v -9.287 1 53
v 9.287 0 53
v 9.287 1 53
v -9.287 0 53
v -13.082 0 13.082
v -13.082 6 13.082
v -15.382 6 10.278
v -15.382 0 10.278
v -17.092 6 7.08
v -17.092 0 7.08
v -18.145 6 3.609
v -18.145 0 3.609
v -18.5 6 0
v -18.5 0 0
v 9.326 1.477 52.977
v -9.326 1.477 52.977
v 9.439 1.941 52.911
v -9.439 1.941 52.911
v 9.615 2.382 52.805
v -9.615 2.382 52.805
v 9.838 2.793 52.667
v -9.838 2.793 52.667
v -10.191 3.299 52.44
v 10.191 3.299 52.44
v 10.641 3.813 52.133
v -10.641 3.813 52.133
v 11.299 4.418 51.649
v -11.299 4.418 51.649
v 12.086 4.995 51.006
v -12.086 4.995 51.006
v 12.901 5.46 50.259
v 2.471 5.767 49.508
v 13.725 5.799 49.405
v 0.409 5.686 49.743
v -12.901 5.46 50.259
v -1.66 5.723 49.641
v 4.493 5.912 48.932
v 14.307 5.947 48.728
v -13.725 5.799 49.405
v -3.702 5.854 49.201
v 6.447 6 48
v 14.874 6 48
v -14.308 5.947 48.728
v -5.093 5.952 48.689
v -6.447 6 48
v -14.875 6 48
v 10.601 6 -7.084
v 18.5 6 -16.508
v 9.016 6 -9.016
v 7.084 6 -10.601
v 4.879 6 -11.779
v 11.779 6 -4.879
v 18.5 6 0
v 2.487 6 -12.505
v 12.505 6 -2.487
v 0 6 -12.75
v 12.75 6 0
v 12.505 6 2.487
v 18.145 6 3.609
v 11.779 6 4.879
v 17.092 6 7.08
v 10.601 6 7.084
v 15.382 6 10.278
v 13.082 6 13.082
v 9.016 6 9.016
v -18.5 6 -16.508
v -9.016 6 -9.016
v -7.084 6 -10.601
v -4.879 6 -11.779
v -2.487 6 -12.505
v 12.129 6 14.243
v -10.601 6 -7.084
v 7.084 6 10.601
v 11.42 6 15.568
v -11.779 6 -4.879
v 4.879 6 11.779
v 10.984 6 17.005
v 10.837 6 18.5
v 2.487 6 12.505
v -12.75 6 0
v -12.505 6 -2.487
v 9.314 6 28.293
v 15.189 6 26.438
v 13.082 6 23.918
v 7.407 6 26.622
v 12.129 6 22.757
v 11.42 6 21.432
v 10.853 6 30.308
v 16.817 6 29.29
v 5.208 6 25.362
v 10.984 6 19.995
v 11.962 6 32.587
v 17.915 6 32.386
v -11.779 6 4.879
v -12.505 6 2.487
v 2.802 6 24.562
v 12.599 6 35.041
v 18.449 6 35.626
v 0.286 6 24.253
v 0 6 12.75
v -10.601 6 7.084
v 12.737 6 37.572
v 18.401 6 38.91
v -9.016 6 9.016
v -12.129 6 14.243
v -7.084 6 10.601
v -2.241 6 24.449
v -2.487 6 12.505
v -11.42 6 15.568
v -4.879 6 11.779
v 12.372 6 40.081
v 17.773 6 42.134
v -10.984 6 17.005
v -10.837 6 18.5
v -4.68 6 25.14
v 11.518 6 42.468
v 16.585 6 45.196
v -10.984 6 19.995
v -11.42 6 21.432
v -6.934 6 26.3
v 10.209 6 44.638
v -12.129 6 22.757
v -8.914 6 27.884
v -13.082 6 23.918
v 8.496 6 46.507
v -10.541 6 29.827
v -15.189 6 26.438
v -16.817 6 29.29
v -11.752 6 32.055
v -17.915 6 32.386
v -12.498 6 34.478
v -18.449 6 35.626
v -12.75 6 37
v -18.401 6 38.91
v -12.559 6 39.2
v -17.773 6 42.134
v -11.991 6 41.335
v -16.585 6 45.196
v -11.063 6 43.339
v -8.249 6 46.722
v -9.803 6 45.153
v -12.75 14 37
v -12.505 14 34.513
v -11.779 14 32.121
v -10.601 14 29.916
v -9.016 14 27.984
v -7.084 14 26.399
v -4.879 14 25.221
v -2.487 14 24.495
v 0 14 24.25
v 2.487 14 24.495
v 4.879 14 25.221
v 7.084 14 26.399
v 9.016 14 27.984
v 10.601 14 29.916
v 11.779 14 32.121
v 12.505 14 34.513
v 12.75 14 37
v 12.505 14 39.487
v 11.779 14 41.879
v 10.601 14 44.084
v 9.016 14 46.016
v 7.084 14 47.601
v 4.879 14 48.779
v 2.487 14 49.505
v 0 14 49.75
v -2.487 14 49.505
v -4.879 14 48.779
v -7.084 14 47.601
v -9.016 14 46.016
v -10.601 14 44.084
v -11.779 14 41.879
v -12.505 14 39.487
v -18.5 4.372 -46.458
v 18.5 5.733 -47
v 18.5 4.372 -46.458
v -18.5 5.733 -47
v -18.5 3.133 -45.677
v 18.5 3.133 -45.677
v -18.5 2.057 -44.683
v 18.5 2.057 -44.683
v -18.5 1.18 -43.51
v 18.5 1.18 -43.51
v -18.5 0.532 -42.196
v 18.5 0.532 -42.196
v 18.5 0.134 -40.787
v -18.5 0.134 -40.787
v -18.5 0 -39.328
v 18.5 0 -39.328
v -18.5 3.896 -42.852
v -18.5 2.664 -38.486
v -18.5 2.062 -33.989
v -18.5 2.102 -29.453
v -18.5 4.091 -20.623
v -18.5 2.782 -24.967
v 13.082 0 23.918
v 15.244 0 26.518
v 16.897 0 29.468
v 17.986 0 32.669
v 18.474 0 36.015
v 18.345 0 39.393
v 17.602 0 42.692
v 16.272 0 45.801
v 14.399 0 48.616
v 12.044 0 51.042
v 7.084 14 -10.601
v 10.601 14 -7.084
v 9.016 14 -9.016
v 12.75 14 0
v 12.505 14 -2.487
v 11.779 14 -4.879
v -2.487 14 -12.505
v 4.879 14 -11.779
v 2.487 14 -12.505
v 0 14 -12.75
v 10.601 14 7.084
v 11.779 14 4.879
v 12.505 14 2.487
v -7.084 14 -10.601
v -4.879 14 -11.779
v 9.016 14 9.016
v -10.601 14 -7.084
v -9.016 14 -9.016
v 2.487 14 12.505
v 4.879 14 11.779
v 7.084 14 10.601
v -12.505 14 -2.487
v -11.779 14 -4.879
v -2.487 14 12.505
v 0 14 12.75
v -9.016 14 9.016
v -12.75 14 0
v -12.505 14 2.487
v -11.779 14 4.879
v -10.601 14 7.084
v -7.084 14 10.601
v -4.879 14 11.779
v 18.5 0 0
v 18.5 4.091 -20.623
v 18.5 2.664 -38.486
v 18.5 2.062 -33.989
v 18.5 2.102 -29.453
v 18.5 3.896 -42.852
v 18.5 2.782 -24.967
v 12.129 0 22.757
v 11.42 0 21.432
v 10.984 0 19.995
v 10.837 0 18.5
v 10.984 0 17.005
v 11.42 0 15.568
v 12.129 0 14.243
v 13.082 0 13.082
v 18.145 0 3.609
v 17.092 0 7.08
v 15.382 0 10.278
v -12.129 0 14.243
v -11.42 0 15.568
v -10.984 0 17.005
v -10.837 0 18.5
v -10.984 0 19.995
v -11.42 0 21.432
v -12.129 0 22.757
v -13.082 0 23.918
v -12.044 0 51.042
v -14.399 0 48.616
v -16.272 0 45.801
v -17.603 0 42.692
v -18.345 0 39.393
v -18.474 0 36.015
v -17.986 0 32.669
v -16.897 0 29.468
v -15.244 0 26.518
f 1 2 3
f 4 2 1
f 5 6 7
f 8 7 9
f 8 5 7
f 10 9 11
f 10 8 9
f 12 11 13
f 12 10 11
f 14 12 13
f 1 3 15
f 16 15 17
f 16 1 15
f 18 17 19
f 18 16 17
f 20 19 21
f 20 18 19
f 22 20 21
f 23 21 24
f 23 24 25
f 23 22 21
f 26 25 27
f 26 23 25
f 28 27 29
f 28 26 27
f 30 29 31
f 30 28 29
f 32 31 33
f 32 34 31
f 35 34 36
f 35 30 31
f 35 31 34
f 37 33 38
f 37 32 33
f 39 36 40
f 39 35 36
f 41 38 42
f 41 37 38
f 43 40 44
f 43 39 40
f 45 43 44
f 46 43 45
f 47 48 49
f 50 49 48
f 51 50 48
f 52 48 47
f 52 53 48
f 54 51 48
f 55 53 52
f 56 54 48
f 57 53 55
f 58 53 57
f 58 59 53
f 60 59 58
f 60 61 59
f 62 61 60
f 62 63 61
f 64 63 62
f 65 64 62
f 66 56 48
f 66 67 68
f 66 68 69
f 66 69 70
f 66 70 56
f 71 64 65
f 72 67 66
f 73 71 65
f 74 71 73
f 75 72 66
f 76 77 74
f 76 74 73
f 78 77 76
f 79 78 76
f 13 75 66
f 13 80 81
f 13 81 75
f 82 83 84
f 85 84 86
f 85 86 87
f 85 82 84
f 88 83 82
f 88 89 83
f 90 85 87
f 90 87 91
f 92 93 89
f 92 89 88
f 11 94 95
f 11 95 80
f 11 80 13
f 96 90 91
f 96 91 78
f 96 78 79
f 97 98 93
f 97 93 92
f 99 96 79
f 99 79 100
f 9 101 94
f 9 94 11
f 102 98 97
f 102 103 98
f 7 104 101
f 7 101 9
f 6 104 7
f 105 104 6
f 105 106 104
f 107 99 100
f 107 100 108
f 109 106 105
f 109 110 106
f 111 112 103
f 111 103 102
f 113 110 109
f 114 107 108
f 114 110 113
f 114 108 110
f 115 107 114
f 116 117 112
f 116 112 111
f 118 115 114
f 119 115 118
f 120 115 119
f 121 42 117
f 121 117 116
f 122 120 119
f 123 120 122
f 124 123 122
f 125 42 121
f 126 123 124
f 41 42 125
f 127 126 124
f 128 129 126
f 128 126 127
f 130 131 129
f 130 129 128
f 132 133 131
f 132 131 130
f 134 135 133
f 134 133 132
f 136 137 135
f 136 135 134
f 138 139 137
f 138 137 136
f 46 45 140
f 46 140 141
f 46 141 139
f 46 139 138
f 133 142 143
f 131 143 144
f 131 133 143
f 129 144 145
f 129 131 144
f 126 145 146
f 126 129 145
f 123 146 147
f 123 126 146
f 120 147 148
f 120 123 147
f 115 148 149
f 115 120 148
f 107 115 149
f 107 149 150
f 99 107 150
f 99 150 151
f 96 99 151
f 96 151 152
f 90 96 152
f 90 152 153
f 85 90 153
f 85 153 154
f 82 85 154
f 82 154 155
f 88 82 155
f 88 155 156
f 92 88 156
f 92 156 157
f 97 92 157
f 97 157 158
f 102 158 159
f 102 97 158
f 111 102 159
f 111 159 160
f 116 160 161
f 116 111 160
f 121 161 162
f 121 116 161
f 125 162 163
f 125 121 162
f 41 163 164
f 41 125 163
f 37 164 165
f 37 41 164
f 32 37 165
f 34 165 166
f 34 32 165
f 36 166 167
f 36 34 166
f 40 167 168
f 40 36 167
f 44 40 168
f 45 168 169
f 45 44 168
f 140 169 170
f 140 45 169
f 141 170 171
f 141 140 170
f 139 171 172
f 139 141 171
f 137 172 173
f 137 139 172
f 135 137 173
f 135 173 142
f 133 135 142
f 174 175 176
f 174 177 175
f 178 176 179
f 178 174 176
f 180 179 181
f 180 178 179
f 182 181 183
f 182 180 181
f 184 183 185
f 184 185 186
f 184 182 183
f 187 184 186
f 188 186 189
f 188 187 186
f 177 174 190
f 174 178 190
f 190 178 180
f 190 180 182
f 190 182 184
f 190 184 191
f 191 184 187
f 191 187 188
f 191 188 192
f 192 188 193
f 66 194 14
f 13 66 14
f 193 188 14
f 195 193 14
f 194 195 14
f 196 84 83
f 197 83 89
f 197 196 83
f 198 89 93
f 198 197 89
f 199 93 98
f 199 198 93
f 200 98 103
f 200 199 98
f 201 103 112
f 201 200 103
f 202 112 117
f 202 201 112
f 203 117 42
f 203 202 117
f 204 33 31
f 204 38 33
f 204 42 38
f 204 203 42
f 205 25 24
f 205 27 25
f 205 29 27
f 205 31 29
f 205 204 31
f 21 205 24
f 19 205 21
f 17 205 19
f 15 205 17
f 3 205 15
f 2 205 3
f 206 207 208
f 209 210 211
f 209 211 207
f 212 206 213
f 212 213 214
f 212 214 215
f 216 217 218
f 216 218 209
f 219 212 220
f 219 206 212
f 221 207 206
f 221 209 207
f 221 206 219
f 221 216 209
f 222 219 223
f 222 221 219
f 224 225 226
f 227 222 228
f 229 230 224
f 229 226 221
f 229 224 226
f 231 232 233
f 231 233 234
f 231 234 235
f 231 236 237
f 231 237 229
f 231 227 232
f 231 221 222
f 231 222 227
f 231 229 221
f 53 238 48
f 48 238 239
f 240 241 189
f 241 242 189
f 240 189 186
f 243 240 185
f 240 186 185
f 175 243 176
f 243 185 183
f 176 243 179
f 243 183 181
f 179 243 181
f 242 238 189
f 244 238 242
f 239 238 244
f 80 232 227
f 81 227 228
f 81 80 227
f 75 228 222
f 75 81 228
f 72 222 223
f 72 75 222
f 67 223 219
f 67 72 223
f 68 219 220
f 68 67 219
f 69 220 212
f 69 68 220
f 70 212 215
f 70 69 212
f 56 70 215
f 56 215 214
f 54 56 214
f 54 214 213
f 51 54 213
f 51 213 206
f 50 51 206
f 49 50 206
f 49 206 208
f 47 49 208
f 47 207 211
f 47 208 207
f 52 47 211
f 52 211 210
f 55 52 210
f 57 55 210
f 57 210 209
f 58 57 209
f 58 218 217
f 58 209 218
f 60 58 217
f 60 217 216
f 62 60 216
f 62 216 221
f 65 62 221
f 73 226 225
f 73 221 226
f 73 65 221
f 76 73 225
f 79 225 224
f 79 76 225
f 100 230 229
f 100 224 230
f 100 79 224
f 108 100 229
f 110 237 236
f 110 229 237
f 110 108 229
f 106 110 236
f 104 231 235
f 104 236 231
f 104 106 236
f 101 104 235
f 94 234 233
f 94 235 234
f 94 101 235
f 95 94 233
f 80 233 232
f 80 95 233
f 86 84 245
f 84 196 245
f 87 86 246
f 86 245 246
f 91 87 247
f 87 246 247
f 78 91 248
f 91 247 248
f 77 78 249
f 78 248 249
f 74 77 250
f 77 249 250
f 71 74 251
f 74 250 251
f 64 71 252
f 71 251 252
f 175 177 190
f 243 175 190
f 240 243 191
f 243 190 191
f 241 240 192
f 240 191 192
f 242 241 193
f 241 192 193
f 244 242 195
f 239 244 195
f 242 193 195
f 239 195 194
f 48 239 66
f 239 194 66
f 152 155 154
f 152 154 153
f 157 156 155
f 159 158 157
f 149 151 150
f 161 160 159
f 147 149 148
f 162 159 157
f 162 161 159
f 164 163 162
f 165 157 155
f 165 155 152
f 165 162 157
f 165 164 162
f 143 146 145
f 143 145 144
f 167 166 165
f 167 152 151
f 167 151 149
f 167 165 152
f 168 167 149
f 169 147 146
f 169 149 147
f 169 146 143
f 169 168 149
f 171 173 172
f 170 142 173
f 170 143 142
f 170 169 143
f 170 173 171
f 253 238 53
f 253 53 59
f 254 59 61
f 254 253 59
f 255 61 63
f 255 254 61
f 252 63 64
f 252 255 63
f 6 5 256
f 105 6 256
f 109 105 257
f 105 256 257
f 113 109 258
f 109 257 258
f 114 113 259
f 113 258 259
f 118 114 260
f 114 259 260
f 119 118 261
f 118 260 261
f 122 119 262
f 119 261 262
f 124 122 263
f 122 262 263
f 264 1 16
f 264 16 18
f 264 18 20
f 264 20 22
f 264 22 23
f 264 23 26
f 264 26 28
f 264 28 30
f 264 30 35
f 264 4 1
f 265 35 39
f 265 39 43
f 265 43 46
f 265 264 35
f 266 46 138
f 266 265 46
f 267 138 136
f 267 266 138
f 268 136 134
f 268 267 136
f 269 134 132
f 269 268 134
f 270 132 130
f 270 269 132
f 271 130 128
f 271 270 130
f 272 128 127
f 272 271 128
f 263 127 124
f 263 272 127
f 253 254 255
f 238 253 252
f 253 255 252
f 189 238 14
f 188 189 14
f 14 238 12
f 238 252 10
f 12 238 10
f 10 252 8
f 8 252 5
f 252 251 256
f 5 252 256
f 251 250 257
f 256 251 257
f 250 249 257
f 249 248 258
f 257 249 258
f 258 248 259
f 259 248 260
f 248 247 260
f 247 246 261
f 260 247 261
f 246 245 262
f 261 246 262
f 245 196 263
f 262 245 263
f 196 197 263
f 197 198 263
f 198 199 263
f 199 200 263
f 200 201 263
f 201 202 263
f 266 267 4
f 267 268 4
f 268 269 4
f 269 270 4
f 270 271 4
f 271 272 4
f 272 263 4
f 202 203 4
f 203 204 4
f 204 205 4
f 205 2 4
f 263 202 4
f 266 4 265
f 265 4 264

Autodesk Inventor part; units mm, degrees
ref_plane "YZ Plane" through (0, 0, 0) normal (1, 0, 0) x (0, 1, 0)
ref_plane "XZ Plane" through (0, 0, 0) normal (0, 1, 0) x (-1, 0, 0)
ref_plane "XY Plane" through (0, 0, 0) normal (0, 0, 1) x (1, 0, 0)
sketch "Sketch1" plane through (0, 0, 0) normal (0, 1, 0) x (-1, 0, 0)
  line L0 (25.9, 0) -> (-25.9, 0) projected
  line L1 (0, -25.9) -> (0, 25.9) projected
  circle A0 centre (0, 0) radius 18.5 construction
  circle A1 centre (0, 0) radius 13 construction
  dimension "d0" = 37
  dimension "d1" = 26
sketch "Sketch2" plane through (0, 0, 0) normal (0, 1, 0) x (-1, 0, 0)
  line L0 (25.9, 0) -> (-25.9, 0) projected
  line L1 (0, -35.8) -> (0, 67.8) projected
  line L2 (-18.5, 53) -> (-18.5, -21)
  line L3 (-18.5, -21) -> (18.5, -21)
  line L4 (18.5, -21) -> (18.5, 53)
  line L5 (-18.5, 53) -> (18.5, 53)
  point P0 (0, 0)
  dimension "d3" = 37
  dimension "d29" = 21
  dimension "d30" = 53
extrude "Extrusion1" add sketch "Sketch2" along normal blind 6
sketch "Sketch6" plane through (0, 0, 0) normal (0, 1, 0) x (-1, 0, 0)
  line L0 (18.5, -21) -> (-18.5, -21) projected
  line L1 (18.5, 53) -> (18.5, -21) projected
  line L2 (-18.5, -21) -> (18.5, -21)
  line L3 (18.5, -21) -> (18.5, 53)
  line L4 (-18.5, 53) -> (-18.5, -21)
  line L5 (25.9, 0) -> (-25.9, 0) projected
  line L6 (0, -36.3) -> (0, 70.8) projected
  arc A0 (-16, 0) -> (16, 0) centre (0, 0) ccw
  line L7 (16, 0) -> (16, 53)
  line L8 (18.5, 53) -> (-18.5, 53) projected
  line L9 (16, 53) -> (18.5, 53)
  line L10 (-16, 0) -> (-16, 53)
  line L11 (-16, 53) -> (-18.5, 53)
  point P0 (-17.3617, -21)
  dimension "d18" = 32
extrude "Extrusion5" [suppressed]
sketch "Sketch4" plane through (0, 0, 0) normal (0, 0, 1) x (1, 0, 0)
  line L0 (-18.5, 0) -> (18.5, 0)
  line L1 (18.5, 0) -> (18.5, -2)
  line L2 (18.5, -2) -> (-18.5, -2)
  line L3 (-18.5, -2) -> (-18.5, 0)
  line L4 (-25.9, 0) -> (25.9, 0) projected
  line L5 (0, -2.4) -> (0, 0.4) projected
  point P0 (0, 0)
  dimension "d10" = 37
  dimension "d11" = 2
extrude "Extrusion6" [suppressed]
sketch "Sketch5" plane through (0, 0, 0) normal (0, 1, 0) x (-1, 0, 0)
  circle A0 centre (0, 0) radius 18.5 construction
  circle A1 centre (0, 0) radius 18.5 construction
  line L0 (25.9, 0) -> (-25.9, 0) projected
  line L1 (0, -28.9) -> (0, 26.4) projected
  line L2 (-18.5, -21) -> (18.5, -21)
  line L3 (18.5, -21) -> (18.5, -18.5)
  line L4 (18.5, -18.5) -> (-18.5, -18.5)
  line L5 (-18.5, -18.5) -> (-18.5, -21)
  dimension "d25" = 37
  dimension "d26" = 21
extrude "Extrusion7" [suppressed]
sketch "Sketch7" plane through (0, 0, 0) normal (0, 0, 1) x (1, 0, 0)
  line L0 (-18.5, 0) -> (18.5, 0)
  line L1 (18.5, 0) -> (18.5, -2)
  line L2 (18.5, -2) -> (-18.5, -2)
  line L3 (-18.5, -2) -> (-18.5, 0)
  line L4 (18.5, 0) -> (-18.5, 0) projected
  line L5 (-25.9, 0) -> (25.9, 0) projected
  line L6 (0, -2.4) -> (0, 0.4) projected
  point P0 (-16, 0)
  point P1 (16, 0)
  dimension "d53" = 2
  dimension "d54" = 18.5
extrude "Extrusion8" [suppressed]
sketch "Sketch8" plane through (0, 0, 0) normal (0, 1, 0) x (-1, 0, 0)
  circle A0 centre (0, 0) radius 12.75
  dimension "d34" = 25.5
extrude "Extrusion9" add sketch "Sketch8" along normal blind 14
pattern_linear "Rectangular Pattern1" count 2 spacing 37 along (0, 0, 1) of "Extrusion9"
sketch "Sketch9" plane through (0, 6, 0) normal (0, 1, 0) x (1, 0, 0)
  circle A0 centre (0, 0) radius 13
  circle A1 centre (0, 0) radius 15
  dimension "d40" = 26
  dimension "d41" = 30
extrude "Extrusion10" [suppressed]
sketch "Sketch10" plane through (0, 5, 0) normal (0, 1, 0) x (1, 0, 0)
  arc A0 (16, 0) -> (-16, 0) centre (0, 0) ccw projected
  line L0 (1.5, -18) -> (-1.5, -18)
  line L1 (-29.4, 0) -> (29.4, 0) projected
  line L2 (0, 36.3) -> (0, -70.8) projected
  line L3 (1.5, -12) -> (-1.5, -12)
  line L4 (1.5, -12) -> (1.5, -18)
  line L5 (-1.5, -18) -> (-1.5, -12)
  dimension "d48" = 3
  dimension "d49" = 12
  dimension "d50" = 6
extrude "Extrusion11" [suppressed]
fillet "Fillet1" radius 5 1 edges at (0, 6, 53)
sketch "Sketch11" plane through (0, 0, 0) normal (0, 1, 0) x (-1, 0, 0)
  line L0 (-18.5, -21) -> (18.5, -21)
  line L1 (18.5, -21) -> (18.5, -47)
  line L2 (18.5, -47) -> (-18.5, -47)
  line L3 (-18.5, -47) -> (-18.5, -21)
  line L4 (25.9, 0) -> (-25.9, 0) projected
  line L5 (0, -60.1) -> (0, 31.6) projected
  point P0 (0, 0)
  dimension "d57" = 26
  dimension "d58" = 21
  dimension "d59" = 37
extrude "Extrusion12" add sketch "Sketch11" along normal blind 6
sketch "Sketch12" plane through (0, 0, 0) normal (1, 0, 0) x (0, 1, 0)
  line L0 (6, 48) -> (6, -47) projected
  arc A0 (6, -16.5081) -> (5.7334, -47) centre (34, -32) ccw
  line L1 (-6.8, 0) -> (40.8, 0) projected
  line L2 (0, -66.5) -> (0, 70) projected
  line L3 (6, -16.5081) -> (6, -47)
  line L4 (6, -47) -> (5.7334, -47)
  line L5 (0, -47) -> (6, -47) projected
  point P0 (0, 0)
  dimension "d62" = 32
  dimension "d63" = 32
  dimension "d64" = 34
extrude "Extrusion13" cut sketch "Sketch12" along normal through all both and the other way through all contours L0 L4 A0
fillet "Fillet3" radius 8 1 edges at (0, 0, -47)
sketch "Sketch13" plane through (0, 0, 0) normal (0, 1, 0) x (-1, 0, 0)
  line L0 (25.9, 0) -> (-25.9, 0) projected
  line L1 (0, -67) -> (0, 73) projected
  line L2 (18.5, 53) -> (18.5, -39.3278) projected
  arc A0 (13.0815, 23.9185) -> (13.0815, 13.0815) centre (18.5, 18.5) ccw
  line L3 (-18.5, 48) -> (-18.5, -16.5081) projected
  arc A1 (-13.0815, 13.0815) -> (-13.0815, 23.9185) centre (-18.5, 18.5) ccw
  line L4 (18.5, 37) -> (18.5, 0)
  line L5 (-18.5, 0) -> (-18.5, 37)
  line L6 (18.5, 37) -> (18.5, 53)
  line L7 (-18.5, 53) -> (18.5, 53) projected
  line L8 (-18.5, 53) -> (-18.5, 37)
  arc A2 (-9.2871, 53) -> (-13.0815, 23.9185) centre (0, 37) ccw
  arc A3 (13.0815, 23.9185) -> (9.2871, 53) centre (0, 37) ccw
  arc A4 (-13.0815, 13.0815) -> (-18.5, 0) centre (0, 0) ccw
  arc A5 (18.5, 0) -> (13.0815, 13.0815) centre (0, 0) ccw
  dimension "d68" = 37
  dimension "d71" = 18.5
  dimension "d72" = 18.5
  dimension "d73" = 7.663
  dimension "d74" = 7.663
  dimension "d75" = 18.5
  dimension "d76" = 18.5
  dimension "d77" = 18.5
  dimension "d78" = 18.5
extrude "Extrusion14" cut sketch "Sketch13" along normal through all contours A5 A0 A3 L2 | A3 L7 L2 | L3 A2 A1 A4 | L3 L8 L7 A2
properties part number "NespressoSpeedfiller-tamper"
